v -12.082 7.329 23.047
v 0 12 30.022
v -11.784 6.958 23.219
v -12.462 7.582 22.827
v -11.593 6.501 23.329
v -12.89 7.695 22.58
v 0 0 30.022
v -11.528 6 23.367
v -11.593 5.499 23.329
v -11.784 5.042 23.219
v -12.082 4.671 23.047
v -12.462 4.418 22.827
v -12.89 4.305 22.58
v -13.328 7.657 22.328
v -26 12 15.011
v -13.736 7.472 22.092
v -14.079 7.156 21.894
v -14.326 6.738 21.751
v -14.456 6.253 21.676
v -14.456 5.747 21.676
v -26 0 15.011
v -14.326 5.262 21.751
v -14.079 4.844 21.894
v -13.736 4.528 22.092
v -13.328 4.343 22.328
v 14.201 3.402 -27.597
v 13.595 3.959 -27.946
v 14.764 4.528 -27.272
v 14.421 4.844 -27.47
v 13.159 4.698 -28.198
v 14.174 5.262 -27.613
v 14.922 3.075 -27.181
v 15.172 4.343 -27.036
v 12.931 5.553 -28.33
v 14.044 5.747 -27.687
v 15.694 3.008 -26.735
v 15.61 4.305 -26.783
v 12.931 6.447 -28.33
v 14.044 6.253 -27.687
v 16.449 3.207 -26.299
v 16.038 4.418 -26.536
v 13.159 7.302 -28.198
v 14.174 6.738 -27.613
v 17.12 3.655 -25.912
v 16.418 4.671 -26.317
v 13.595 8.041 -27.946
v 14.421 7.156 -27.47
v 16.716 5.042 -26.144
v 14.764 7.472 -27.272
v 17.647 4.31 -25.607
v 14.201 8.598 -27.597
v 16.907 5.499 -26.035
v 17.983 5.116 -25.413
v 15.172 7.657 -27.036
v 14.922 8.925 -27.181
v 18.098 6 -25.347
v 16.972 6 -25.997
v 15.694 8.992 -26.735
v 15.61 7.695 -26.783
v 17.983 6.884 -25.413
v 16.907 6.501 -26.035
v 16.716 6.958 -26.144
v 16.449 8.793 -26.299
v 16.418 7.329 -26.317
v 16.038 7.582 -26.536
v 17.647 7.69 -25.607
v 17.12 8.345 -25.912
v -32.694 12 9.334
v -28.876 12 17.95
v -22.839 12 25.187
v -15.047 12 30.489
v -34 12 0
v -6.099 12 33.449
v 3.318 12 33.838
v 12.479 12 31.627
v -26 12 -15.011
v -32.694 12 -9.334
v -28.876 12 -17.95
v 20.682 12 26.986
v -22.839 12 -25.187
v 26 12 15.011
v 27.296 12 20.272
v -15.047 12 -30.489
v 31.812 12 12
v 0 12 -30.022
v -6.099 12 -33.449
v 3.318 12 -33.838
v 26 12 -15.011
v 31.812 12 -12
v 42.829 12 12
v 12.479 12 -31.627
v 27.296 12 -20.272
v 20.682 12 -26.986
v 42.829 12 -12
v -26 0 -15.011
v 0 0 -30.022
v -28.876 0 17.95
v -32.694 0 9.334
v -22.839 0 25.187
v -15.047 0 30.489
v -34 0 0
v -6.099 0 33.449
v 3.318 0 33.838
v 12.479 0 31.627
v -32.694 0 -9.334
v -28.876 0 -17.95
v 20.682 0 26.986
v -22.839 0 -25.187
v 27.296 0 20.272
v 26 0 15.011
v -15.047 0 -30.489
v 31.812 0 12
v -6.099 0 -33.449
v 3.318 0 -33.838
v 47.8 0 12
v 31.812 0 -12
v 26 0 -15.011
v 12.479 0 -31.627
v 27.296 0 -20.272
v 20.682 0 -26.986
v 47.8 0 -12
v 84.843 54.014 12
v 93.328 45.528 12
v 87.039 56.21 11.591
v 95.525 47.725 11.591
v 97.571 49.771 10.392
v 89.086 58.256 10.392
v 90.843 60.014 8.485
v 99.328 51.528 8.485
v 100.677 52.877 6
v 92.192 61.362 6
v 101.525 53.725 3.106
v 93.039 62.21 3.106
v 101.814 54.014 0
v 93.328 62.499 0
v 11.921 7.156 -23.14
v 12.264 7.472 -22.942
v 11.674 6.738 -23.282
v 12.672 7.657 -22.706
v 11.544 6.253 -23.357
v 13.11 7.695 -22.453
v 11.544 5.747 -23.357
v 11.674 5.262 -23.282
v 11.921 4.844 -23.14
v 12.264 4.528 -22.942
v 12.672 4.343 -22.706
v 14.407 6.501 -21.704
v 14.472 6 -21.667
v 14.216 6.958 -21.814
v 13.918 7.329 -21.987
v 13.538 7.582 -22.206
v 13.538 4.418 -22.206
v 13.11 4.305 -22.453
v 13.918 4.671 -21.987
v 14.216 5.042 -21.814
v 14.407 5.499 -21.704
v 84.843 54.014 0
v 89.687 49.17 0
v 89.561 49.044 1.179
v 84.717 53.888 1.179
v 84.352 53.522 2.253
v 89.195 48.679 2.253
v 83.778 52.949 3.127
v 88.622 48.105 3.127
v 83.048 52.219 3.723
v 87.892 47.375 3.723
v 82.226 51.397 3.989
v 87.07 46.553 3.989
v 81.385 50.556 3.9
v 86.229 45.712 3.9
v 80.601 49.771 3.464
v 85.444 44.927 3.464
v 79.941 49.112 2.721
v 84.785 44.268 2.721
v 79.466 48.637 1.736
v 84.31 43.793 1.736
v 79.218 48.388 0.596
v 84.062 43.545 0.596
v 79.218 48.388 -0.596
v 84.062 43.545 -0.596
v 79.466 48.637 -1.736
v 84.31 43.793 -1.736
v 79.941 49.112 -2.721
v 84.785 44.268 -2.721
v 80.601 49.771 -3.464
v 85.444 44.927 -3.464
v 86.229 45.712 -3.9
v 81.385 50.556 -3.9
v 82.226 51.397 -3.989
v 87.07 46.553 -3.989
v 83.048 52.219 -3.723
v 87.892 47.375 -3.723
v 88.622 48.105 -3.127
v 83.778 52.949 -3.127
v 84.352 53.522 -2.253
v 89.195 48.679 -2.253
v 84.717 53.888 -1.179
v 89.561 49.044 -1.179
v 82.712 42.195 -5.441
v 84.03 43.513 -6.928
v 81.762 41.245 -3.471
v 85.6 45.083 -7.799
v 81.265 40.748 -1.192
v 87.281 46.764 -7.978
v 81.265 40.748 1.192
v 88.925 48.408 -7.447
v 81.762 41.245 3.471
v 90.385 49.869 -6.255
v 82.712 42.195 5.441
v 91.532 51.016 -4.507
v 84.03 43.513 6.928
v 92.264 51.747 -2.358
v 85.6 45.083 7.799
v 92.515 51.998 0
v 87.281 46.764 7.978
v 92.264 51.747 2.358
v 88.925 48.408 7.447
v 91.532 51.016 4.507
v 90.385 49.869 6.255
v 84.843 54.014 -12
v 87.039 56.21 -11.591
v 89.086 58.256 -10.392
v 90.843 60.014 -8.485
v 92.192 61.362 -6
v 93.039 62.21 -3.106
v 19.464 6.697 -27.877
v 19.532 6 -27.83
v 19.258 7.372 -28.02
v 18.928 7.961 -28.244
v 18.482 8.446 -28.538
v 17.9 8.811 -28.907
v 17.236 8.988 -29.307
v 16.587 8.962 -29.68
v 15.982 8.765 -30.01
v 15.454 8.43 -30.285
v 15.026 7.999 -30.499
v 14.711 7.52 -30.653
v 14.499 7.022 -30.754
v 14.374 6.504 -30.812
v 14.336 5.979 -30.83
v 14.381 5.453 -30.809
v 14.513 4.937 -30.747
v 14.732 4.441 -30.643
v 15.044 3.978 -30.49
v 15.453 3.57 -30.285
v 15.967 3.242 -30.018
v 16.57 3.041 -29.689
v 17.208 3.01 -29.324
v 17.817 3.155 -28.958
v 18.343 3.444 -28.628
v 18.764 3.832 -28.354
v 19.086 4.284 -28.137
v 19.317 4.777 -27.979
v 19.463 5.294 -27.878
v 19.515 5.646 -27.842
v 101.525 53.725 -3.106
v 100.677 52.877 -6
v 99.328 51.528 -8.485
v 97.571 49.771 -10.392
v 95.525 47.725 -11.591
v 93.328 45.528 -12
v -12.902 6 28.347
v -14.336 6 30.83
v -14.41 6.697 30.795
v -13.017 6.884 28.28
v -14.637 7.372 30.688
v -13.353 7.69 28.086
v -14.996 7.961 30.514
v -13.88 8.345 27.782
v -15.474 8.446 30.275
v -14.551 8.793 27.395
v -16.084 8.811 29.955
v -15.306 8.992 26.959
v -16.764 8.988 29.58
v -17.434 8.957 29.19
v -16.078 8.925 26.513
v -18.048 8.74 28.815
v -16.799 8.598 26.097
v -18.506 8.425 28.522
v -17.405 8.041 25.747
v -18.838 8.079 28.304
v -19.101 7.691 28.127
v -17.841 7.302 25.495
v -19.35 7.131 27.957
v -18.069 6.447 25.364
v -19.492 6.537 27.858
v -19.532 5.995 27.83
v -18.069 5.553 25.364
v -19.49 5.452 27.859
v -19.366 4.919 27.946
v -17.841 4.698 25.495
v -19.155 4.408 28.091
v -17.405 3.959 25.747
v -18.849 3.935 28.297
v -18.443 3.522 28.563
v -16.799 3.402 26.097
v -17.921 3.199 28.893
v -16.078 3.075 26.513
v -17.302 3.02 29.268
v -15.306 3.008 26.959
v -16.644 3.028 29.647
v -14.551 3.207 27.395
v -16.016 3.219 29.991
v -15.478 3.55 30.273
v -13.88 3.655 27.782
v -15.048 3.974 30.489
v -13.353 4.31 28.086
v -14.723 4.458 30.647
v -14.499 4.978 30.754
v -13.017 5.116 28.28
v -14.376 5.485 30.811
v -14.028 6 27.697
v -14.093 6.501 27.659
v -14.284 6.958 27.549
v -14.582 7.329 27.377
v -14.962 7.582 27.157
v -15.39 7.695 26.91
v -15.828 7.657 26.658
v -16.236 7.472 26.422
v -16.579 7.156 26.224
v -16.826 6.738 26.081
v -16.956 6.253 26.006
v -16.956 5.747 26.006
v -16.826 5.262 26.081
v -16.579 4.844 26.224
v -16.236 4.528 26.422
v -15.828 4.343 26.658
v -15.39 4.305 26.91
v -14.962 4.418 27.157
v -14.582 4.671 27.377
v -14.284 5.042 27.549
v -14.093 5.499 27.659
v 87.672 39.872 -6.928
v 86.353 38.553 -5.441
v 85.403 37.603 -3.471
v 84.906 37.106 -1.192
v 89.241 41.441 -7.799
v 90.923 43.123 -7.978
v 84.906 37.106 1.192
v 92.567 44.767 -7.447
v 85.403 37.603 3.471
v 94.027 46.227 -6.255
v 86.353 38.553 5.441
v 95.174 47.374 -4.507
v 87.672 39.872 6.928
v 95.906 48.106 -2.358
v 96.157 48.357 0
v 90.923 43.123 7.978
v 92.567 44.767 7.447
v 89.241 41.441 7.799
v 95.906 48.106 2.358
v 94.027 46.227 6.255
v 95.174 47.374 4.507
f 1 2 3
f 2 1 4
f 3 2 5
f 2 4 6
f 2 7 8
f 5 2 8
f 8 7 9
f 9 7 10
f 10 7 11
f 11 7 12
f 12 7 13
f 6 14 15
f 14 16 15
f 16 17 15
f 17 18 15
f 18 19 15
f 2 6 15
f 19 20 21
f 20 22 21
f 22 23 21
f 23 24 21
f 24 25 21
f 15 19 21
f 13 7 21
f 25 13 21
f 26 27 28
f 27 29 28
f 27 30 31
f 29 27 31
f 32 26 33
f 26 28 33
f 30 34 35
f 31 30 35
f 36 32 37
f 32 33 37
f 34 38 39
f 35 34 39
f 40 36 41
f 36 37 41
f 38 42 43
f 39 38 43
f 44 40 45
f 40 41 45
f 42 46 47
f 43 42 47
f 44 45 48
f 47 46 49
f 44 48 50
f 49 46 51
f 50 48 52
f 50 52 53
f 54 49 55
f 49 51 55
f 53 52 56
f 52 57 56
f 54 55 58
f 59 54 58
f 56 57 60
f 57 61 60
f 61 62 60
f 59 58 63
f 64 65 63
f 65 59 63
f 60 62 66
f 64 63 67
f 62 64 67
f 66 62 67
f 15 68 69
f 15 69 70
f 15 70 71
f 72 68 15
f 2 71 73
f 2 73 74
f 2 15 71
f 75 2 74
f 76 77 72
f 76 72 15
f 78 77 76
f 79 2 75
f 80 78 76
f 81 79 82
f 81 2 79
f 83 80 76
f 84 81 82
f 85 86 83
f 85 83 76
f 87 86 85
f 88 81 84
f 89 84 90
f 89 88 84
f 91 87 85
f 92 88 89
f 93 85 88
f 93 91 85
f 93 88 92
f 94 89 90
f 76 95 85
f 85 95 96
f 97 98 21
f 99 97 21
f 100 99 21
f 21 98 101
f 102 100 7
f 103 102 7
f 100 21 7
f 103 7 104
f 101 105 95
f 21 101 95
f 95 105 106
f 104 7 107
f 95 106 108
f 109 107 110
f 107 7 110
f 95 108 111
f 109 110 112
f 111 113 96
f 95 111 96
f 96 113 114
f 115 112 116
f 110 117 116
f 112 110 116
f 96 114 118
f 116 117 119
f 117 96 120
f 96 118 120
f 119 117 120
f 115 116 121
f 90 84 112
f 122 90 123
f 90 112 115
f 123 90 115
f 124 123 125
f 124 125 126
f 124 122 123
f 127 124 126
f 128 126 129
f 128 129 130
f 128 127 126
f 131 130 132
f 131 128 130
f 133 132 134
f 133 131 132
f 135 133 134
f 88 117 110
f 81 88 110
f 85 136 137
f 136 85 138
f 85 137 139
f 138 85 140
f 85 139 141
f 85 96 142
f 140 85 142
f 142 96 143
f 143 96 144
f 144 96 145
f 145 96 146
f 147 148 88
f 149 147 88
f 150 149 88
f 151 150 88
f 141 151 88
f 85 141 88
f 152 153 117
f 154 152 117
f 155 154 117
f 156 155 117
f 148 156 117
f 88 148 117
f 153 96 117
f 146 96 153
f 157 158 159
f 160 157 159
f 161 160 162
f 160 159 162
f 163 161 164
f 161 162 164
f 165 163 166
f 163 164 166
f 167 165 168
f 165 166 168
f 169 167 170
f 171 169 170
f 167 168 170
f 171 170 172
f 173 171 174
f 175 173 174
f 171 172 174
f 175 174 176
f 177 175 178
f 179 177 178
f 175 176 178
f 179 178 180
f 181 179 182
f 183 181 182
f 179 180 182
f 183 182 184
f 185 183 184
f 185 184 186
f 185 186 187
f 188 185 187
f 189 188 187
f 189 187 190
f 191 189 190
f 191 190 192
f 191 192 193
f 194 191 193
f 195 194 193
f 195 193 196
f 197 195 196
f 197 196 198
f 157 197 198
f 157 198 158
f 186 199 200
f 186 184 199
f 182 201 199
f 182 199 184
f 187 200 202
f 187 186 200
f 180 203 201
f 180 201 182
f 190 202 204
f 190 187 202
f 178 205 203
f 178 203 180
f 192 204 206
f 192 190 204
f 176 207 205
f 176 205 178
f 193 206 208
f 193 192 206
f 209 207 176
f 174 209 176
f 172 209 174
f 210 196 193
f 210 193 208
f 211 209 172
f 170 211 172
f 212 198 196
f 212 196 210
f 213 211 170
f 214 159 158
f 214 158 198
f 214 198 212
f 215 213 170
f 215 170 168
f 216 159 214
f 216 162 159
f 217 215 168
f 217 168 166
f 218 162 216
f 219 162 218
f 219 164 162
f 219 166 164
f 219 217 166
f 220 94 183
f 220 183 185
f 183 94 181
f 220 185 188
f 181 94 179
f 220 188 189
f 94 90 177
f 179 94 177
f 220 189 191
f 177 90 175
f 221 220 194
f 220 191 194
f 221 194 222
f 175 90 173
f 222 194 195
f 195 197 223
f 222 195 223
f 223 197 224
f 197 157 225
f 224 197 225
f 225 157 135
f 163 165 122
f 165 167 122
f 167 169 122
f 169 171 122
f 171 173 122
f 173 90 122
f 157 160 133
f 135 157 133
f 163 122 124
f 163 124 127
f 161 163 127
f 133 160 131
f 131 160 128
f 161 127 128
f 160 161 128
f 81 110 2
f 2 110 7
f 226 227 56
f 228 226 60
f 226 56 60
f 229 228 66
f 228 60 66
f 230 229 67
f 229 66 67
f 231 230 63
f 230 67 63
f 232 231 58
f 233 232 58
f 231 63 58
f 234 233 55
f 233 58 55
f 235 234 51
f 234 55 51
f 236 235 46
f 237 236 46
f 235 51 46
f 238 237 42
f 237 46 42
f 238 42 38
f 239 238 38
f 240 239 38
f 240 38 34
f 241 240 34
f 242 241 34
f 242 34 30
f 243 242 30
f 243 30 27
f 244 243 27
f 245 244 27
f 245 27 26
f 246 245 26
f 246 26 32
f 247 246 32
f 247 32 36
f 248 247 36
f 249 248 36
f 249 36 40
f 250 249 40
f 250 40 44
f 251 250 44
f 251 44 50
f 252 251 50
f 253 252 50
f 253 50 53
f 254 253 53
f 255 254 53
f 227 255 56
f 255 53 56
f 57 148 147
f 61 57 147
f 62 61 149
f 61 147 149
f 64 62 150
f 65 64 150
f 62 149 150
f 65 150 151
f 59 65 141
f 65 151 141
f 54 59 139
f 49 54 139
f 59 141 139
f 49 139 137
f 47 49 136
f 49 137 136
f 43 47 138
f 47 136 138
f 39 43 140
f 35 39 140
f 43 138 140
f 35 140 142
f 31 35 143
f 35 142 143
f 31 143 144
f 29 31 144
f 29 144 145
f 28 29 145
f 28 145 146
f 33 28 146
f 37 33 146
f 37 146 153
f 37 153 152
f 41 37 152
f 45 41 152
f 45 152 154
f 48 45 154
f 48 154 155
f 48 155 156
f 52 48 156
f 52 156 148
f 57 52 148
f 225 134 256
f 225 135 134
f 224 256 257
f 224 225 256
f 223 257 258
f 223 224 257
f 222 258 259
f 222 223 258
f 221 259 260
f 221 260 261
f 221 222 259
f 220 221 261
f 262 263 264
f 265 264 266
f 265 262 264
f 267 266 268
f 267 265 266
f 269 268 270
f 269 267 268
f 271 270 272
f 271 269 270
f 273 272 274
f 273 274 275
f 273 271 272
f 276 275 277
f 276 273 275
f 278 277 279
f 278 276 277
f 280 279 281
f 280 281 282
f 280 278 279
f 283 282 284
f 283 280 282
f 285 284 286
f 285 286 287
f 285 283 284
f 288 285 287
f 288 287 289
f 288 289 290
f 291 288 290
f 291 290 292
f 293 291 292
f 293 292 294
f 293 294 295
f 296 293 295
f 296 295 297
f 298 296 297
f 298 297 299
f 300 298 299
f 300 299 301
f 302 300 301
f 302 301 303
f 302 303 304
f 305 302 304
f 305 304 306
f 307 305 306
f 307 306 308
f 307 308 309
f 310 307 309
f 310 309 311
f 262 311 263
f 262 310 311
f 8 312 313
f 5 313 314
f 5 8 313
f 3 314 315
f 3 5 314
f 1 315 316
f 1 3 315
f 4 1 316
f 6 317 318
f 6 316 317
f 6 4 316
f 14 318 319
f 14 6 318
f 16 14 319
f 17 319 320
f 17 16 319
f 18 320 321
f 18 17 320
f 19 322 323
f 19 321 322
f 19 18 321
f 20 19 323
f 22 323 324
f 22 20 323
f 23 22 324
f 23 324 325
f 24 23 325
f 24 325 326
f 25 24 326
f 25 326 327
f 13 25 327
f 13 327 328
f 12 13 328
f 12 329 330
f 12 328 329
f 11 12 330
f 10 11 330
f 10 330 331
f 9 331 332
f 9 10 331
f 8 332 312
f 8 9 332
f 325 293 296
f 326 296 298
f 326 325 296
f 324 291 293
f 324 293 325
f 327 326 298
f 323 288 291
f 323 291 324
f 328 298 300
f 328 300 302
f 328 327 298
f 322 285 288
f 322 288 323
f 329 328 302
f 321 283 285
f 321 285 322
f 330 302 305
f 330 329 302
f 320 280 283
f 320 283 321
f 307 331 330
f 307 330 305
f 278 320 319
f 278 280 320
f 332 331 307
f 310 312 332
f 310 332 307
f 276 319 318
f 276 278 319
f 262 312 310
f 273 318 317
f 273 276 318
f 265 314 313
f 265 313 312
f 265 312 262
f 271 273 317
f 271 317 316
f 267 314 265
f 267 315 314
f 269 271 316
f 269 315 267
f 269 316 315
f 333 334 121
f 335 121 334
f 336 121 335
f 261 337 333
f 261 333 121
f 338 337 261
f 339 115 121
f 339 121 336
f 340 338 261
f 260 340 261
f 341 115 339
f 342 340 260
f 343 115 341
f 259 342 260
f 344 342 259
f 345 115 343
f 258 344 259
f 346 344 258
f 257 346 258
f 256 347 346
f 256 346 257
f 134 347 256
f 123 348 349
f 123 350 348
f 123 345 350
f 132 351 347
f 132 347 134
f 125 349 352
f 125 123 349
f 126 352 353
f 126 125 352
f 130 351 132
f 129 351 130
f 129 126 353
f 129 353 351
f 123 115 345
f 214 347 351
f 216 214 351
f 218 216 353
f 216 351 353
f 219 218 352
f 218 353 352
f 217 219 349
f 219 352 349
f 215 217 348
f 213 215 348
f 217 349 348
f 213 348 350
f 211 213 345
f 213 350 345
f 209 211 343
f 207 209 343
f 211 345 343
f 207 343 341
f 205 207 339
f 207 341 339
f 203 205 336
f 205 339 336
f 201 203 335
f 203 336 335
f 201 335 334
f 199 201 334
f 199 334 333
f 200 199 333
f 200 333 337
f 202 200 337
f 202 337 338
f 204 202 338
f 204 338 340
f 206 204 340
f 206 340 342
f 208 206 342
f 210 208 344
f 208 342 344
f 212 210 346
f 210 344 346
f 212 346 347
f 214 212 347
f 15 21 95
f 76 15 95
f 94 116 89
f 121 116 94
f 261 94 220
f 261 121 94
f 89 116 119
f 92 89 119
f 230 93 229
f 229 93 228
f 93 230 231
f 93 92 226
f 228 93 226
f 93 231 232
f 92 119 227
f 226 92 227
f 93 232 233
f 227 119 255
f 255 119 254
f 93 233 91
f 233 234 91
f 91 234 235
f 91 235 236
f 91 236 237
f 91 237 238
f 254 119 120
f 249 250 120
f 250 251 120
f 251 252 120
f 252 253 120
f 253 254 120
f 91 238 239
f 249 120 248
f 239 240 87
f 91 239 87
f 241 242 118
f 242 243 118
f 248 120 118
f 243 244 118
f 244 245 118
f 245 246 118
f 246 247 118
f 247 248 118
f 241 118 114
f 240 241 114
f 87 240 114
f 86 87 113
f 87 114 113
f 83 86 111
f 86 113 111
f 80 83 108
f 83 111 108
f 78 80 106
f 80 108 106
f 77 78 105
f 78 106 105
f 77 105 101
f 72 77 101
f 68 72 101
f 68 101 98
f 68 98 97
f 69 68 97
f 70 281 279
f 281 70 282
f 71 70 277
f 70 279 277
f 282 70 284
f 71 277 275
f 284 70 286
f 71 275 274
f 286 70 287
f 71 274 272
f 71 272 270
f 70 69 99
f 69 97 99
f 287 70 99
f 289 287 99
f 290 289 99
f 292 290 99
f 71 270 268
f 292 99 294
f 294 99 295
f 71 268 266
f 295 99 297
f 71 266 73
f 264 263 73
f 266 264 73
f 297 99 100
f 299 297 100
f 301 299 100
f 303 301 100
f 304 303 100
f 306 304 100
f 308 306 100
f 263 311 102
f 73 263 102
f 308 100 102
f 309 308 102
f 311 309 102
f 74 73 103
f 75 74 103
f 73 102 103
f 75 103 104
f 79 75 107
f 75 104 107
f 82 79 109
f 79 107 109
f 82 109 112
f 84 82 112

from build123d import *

# Parameters (mm, degrees)
BOSS_EXTRUDE1_DEPTH = 12
SKETCH4_W           = 76.386919113
SKETCH4_H           = 24
SKETCH4_R           = 4
BOSS_EXTRUDE2_DEPTH = 12
SKETCH4_3_R         = 8
SKETCH4_3_R_2       = 4
CUT_EXTRUDE1_DEPTH  = 5.15
FILLET1_R           = 12
SKETCH5_R           = 1.7
CUT_EXTRUDE2_DEPTH  = 123.426024465
CUT_EXTRUDE3_START  = -5
SKETCH5_3_R         = 3
CUT_EXTRUDE3_DEPTH  = 118.426024512


with BuildPart() as part:
    # Sketch3 → Boss-Extrude1 (new body)
    with BuildSketch(Plane(origin=(0, 0, 0), x_dir=(1, 0, 0), z_dir=(0, 1, 0))):
        with BuildLine():
            Line((-26, 15.011106999), (0, 30.022213998))
            Line((0, 30.022213998), (26, 15.011106999))
            Line((26, 15.011106999), (26, 12))
            Line((26, 12), (31.811947441, 12))
            ThreePointArc((31.811947441, 12), (-34, 0), (31.811947441, -12))
            Line((31.811947441, -12), (26, -12))
            Line((26, -12), (26, -15.011106999))
            Line((26, -15.011106999), (0, -30.022213998))
            Line((0, -30.022213998), (-26, -15.011106999))
            Line((-26, -15.011106999), (-26, 15.011106999))
        make_face()
        with BuildLine():
            Line((31.811947441, 12), (26, 12))
            Line((26, 12), (26, -12))
            Line((26, -12), (31.811947441, -12))
            ThreePointArc((31.811947441, -12), (33.448514264, -6.098925602), (34, 0))
            ThreePointArc((34, 0), (33.448514264, 6.098925602), (31.811947441, 12))
        make_face()
        with BuildLine():
            Line((47.8, 12), (31.811947441, 12))
            ThreePointArc((31.811947441, 12), (33.448514264, 6.098925602), (34, 0))
            ThreePointArc((34, 0), (33.448514264, -6.098925602), (31.811947441, -12))
            Line((31.811947441, -12), (47.8, -12))
            Line((47.8, -12), (47.8, 12))
        make_face()
    extrude(amount=BOSS_EXTRUDE1_DEPTH)

    # Sketch4 → Boss-Extrude2 (add)
    with BuildSketch(Plane(origin=(23.9, -23.9, 0), x_dir=(0.7071067811865462, 0.707106781186549, 0), z_dir=(0.707106781186549, -0.7071067811865462, 0))):
        with Locations((71.993163698, 0)):
            Rectangle(SKETCH4_W, SKETCH4_H)
        with Locations((94.186623254, 0)):
            Circle(SKETCH4_R, mode=Mode.SUBTRACT)
    extrude(amount=-BOSS_EXTRUDE2_DEPTH)

    # Sketch4<3> → Cut-Extrude1 (cut)
    with BuildSketch(Plane(origin=(23.9, -23.9, 0), x_dir=(0.7071067811865462, 0.707106781186549, 0), z_dir=(0.707106781186549, -0.7071067811865462, 0))):
        with Locations((94.186623254, 0)):
            Circle(SKETCH4_3_R)
        with Locations((94.186623254, 0)):
            Circle(SKETCH4_3_R_2, mode=Mode.SUBTRACT)
    extrude(amount=-CUT_EXTRUDE1_DEPTH, mode=Mode.SUBTRACT)

    # Fillet1
    fillet1_edges = [part.edges().sort_by_distance(p)[0] for p in [
        (97.571067812, 58.256349186, -12),
        (97.571067812, 58.256349186, 12),
    ]]
    fillet(fillet1_edges, radius=FILLET1_R - 0.0001)  # a hair under: the kernel refuses the full size

    # Sketch5 → Cut-Extrude2 (cut, through all)
    with BuildSketch(Plane(origin=(13, 0, -22.516660498), x_dir=(0.8660254037844415, 0, 0.4999999999999951), z_dir=(-0.49999999999999517, 0, 0.8660254037844416))):
        with Locations((0, 6)):
            Circle(SKETCH5_R)
    cut_extrude2 = extrude(amount=-CUT_EXTRUDE2_DEPTH, mode=Mode.SUBTRACT)

    # Sketch5<3> → Cut-Extrude3 (cut, through all)
    with BuildSketch(Plane(origin=(13, 0, -22.516660498), x_dir=(0.8660254037844415, 0, 0.4999999999999951), z_dir=(-0.49999999999999517, 0, 0.8660254037844416)).offset(CUT_EXTRUDE3_START)):
        with Locations((0, 6)):
            Circle(SKETCH5_3_R)
    cut_extrude3 = extrude(amount=-CUT_EXTRUDE3_DEPTH, mode=Mode.SUBTRACT)

    # Mirror1: Cut-Extrude2, Cut-Extrude3 across plane
    add(cut_extrude2.mirror(Plane(origin=(0, 0, 0), x_dir=(0.8660254037844415, 0, 0.49999999999999517), z_dir=(-0.49999999999999506, 0, 0.8660254037844415))), mode=Mode.SUBTRACT)
    add(cut_extrude3.mirror(Plane(origin=(0, 0, 0), x_dir=(0.8660254037844415, 0, 0.49999999999999517), z_dir=(-0.49999999999999506, 0, 0.8660254037844415))), mode=Mode.SUBTRACT)


solid = part.part
